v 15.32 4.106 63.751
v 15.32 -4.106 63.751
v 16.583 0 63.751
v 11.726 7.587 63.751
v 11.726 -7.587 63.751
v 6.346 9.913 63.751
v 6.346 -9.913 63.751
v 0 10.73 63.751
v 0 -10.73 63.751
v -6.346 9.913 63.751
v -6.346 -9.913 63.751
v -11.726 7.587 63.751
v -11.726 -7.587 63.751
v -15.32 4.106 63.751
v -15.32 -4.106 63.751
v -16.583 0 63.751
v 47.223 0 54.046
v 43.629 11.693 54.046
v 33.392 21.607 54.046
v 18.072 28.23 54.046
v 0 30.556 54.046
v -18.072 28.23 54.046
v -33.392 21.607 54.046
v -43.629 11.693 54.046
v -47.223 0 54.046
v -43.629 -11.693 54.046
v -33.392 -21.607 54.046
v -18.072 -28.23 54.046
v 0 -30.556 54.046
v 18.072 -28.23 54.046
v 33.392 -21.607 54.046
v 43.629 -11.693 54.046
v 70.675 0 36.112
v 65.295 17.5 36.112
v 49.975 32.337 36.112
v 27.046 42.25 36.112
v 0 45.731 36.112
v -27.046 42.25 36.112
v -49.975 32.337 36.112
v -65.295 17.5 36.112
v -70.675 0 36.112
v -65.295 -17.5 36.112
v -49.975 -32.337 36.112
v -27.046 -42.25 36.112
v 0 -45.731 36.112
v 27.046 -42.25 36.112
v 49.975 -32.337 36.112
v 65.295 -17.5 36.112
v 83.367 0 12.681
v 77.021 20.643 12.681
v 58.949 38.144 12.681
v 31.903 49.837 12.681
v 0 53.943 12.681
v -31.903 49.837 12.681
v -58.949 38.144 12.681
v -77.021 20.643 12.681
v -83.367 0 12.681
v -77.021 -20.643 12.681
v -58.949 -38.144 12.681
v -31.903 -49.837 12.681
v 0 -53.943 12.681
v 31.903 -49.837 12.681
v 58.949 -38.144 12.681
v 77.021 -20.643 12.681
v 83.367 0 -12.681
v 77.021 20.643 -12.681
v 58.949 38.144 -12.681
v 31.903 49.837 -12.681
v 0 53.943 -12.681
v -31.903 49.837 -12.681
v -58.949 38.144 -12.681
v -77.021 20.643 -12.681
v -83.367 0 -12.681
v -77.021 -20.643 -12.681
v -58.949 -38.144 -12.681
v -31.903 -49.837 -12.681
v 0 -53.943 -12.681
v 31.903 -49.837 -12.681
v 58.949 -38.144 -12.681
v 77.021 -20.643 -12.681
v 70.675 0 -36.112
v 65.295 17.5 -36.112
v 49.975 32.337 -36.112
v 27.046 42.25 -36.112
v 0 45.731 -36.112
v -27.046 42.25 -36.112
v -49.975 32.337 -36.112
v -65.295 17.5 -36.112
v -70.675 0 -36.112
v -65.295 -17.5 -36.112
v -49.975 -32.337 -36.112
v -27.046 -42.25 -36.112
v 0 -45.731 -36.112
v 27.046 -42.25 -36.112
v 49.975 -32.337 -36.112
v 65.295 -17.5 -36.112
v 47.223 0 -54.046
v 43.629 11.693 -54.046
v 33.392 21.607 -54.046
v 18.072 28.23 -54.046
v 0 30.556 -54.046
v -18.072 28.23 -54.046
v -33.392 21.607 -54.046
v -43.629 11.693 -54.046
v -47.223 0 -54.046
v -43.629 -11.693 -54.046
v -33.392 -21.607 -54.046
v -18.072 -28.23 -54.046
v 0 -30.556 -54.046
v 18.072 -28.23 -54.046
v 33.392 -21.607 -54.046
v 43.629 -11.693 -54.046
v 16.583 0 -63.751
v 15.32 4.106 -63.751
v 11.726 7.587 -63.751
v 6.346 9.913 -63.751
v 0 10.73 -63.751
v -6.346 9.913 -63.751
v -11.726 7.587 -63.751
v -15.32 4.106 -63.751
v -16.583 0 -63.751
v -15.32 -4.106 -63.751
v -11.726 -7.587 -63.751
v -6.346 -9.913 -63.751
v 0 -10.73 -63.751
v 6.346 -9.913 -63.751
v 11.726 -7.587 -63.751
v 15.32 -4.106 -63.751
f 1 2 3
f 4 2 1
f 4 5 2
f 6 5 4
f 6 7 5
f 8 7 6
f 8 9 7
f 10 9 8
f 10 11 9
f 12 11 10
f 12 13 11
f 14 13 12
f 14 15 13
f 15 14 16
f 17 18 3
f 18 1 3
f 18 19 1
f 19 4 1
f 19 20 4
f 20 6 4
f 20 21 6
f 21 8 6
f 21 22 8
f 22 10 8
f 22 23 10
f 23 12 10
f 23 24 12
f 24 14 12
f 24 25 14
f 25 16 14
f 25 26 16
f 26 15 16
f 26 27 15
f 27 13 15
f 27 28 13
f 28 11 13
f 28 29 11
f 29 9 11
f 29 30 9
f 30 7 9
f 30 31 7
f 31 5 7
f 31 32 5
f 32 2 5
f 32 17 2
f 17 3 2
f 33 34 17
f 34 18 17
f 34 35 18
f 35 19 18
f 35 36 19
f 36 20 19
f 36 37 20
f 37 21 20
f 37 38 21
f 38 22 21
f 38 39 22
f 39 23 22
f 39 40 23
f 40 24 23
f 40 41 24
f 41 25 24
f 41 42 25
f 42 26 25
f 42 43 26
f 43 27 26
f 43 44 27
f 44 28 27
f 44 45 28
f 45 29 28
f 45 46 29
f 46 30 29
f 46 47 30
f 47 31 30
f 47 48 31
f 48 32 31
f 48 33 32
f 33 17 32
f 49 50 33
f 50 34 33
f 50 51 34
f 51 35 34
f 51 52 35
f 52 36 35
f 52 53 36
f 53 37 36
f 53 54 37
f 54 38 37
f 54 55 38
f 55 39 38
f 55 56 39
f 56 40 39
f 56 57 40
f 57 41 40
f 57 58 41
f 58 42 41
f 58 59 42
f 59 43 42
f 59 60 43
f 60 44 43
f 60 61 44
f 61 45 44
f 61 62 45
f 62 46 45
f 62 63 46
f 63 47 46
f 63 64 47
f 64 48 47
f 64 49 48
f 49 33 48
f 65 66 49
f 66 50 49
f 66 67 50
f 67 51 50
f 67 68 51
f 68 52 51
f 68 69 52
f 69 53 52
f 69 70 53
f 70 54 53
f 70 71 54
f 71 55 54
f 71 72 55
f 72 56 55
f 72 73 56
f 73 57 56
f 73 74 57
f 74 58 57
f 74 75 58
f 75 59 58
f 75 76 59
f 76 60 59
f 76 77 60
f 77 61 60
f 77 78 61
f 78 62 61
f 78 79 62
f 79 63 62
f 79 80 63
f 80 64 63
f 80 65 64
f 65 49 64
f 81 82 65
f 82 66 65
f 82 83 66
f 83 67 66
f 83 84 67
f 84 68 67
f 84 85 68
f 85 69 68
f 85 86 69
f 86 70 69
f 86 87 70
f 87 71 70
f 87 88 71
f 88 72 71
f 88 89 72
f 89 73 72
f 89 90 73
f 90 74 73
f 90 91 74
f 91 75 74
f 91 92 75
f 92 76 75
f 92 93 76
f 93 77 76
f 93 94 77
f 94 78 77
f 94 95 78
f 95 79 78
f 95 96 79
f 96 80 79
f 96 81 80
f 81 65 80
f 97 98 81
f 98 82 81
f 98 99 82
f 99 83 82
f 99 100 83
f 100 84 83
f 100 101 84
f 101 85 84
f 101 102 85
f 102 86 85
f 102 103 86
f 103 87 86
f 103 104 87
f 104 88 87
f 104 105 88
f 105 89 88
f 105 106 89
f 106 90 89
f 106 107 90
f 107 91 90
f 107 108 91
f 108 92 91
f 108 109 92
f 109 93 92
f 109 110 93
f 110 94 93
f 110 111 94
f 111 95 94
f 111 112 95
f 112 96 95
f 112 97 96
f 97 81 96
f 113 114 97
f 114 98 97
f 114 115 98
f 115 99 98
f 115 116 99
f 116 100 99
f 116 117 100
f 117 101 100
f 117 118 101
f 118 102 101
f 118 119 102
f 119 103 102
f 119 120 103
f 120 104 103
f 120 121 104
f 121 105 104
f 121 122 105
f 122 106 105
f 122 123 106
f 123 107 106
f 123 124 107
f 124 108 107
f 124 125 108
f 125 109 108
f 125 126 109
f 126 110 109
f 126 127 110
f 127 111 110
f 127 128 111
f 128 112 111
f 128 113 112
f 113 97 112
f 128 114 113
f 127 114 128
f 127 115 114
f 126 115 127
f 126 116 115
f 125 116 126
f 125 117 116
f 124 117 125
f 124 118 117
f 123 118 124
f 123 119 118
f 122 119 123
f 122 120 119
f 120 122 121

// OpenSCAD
// Generated by SolidPython 1.0.1 on 2020-07-29 00:46:53


scale(v = [17, 11, 13]) {
	sphere(r = 5);
}
/***********************************************
*********      SolidPython code:      **********
************************************************
 
# import packages: SolidPython
from solid import *
from solid.utils import *
from itertools import chain, combinations, permutations


class Resize:

    def __init__(self, scad_file):
        self.scad_file = scad_file
        #self.scad_file = import_scad(scad_file)
        # cone/cylinder param:
        self.r1 = 0
        self.r2 = 0
        self.h = 0
        # rectangular prism param:
        self.w = 0
        self.l = 0
        # ellipse param:
        self.r = 0

    # import OpenScad code (file name corresponds to shape)


    # classify shape + parameters
    def assign(self, param1, param2, param3):
        if self.scad_file == 'cone.scad':
            self.r1 = param1
            self.r2 = param2
            self.h = param3
        elif self.scad_file == 'cylinder.scad':
            self.r1 = param1
            self.r2 = param2
            self.h = param3
        elif self.scad_file == 'rectangularPrism.scad':
            self.h = param1
            self.l = param2
            self.w = param3
        else:
            self.r = param1
            self.h = param2

    # resize parameters
    def iterate(self):
        x = range(3, 20, 2)
        i = 1
        if self.scad_file == 'cone.scad':
            tempList = list(permutations(x, 2))
            for temp in tempList:
                param1 = temp[0]
                param2 = temp[1]
                filepath = 'produced_scad_files/' + 'cone' + str(param1) + '_' + str(param2) + '_' + '.scad'
                scad_render_to_file(cylinder(h=param1, r1=param2, r2=0), filepath)

        elif self.scad_file == 'cylinder.scad':
            tempList = list(permutations(x, 3))
            for temp in tempList:
                param1 = temp[0]
                param2 = temp[1]
                filepath = 'produced_scad_files/' + 'cylinder' + str(param1) + '_' + str(param2) + '_' + '.scad'
                scad_render_to_file(cylinder(h=param1, r1=param2, r2=param2), filepath)

        elif self.scad_file == 'rectangularPrism.scad':
            tempList = list(permutations(x, 3))
            for temp in tempList:
                param1 = temp[0]
                param2 = temp[1]
                param3 = temp[2]
                filepath = 'produced_scad_files/' + 'rectangularPrism' + str(param1) + '_' + str(param2) + '_' + str(
                    param3) + '.scad'
                scad_render_to_file(cube(size=(param1, param2, param3)), filepath)

        elif self.scad_file == 'ellipse.scad':
            tempList = list(permutations(x, 4))
            for temp in tempList:
                param1 = temp[0]
                param2 = temp[1]
                param3 = temp[2]
                param4 = temp[3]
                filepath = 'produced_scad_files/' + 'ellipse' + str(param1) + '_' + str(param2) + '_' + str(param3) + '_' + str(param4) + '.scad'
                scad_render_to_file(scale([param1, param2, param3])(sphere(r=param4)), filepath)

    def render_to_scadfile(self):
        scad_render_to_file(scad, 'example.scad') 
 
************************************************/
